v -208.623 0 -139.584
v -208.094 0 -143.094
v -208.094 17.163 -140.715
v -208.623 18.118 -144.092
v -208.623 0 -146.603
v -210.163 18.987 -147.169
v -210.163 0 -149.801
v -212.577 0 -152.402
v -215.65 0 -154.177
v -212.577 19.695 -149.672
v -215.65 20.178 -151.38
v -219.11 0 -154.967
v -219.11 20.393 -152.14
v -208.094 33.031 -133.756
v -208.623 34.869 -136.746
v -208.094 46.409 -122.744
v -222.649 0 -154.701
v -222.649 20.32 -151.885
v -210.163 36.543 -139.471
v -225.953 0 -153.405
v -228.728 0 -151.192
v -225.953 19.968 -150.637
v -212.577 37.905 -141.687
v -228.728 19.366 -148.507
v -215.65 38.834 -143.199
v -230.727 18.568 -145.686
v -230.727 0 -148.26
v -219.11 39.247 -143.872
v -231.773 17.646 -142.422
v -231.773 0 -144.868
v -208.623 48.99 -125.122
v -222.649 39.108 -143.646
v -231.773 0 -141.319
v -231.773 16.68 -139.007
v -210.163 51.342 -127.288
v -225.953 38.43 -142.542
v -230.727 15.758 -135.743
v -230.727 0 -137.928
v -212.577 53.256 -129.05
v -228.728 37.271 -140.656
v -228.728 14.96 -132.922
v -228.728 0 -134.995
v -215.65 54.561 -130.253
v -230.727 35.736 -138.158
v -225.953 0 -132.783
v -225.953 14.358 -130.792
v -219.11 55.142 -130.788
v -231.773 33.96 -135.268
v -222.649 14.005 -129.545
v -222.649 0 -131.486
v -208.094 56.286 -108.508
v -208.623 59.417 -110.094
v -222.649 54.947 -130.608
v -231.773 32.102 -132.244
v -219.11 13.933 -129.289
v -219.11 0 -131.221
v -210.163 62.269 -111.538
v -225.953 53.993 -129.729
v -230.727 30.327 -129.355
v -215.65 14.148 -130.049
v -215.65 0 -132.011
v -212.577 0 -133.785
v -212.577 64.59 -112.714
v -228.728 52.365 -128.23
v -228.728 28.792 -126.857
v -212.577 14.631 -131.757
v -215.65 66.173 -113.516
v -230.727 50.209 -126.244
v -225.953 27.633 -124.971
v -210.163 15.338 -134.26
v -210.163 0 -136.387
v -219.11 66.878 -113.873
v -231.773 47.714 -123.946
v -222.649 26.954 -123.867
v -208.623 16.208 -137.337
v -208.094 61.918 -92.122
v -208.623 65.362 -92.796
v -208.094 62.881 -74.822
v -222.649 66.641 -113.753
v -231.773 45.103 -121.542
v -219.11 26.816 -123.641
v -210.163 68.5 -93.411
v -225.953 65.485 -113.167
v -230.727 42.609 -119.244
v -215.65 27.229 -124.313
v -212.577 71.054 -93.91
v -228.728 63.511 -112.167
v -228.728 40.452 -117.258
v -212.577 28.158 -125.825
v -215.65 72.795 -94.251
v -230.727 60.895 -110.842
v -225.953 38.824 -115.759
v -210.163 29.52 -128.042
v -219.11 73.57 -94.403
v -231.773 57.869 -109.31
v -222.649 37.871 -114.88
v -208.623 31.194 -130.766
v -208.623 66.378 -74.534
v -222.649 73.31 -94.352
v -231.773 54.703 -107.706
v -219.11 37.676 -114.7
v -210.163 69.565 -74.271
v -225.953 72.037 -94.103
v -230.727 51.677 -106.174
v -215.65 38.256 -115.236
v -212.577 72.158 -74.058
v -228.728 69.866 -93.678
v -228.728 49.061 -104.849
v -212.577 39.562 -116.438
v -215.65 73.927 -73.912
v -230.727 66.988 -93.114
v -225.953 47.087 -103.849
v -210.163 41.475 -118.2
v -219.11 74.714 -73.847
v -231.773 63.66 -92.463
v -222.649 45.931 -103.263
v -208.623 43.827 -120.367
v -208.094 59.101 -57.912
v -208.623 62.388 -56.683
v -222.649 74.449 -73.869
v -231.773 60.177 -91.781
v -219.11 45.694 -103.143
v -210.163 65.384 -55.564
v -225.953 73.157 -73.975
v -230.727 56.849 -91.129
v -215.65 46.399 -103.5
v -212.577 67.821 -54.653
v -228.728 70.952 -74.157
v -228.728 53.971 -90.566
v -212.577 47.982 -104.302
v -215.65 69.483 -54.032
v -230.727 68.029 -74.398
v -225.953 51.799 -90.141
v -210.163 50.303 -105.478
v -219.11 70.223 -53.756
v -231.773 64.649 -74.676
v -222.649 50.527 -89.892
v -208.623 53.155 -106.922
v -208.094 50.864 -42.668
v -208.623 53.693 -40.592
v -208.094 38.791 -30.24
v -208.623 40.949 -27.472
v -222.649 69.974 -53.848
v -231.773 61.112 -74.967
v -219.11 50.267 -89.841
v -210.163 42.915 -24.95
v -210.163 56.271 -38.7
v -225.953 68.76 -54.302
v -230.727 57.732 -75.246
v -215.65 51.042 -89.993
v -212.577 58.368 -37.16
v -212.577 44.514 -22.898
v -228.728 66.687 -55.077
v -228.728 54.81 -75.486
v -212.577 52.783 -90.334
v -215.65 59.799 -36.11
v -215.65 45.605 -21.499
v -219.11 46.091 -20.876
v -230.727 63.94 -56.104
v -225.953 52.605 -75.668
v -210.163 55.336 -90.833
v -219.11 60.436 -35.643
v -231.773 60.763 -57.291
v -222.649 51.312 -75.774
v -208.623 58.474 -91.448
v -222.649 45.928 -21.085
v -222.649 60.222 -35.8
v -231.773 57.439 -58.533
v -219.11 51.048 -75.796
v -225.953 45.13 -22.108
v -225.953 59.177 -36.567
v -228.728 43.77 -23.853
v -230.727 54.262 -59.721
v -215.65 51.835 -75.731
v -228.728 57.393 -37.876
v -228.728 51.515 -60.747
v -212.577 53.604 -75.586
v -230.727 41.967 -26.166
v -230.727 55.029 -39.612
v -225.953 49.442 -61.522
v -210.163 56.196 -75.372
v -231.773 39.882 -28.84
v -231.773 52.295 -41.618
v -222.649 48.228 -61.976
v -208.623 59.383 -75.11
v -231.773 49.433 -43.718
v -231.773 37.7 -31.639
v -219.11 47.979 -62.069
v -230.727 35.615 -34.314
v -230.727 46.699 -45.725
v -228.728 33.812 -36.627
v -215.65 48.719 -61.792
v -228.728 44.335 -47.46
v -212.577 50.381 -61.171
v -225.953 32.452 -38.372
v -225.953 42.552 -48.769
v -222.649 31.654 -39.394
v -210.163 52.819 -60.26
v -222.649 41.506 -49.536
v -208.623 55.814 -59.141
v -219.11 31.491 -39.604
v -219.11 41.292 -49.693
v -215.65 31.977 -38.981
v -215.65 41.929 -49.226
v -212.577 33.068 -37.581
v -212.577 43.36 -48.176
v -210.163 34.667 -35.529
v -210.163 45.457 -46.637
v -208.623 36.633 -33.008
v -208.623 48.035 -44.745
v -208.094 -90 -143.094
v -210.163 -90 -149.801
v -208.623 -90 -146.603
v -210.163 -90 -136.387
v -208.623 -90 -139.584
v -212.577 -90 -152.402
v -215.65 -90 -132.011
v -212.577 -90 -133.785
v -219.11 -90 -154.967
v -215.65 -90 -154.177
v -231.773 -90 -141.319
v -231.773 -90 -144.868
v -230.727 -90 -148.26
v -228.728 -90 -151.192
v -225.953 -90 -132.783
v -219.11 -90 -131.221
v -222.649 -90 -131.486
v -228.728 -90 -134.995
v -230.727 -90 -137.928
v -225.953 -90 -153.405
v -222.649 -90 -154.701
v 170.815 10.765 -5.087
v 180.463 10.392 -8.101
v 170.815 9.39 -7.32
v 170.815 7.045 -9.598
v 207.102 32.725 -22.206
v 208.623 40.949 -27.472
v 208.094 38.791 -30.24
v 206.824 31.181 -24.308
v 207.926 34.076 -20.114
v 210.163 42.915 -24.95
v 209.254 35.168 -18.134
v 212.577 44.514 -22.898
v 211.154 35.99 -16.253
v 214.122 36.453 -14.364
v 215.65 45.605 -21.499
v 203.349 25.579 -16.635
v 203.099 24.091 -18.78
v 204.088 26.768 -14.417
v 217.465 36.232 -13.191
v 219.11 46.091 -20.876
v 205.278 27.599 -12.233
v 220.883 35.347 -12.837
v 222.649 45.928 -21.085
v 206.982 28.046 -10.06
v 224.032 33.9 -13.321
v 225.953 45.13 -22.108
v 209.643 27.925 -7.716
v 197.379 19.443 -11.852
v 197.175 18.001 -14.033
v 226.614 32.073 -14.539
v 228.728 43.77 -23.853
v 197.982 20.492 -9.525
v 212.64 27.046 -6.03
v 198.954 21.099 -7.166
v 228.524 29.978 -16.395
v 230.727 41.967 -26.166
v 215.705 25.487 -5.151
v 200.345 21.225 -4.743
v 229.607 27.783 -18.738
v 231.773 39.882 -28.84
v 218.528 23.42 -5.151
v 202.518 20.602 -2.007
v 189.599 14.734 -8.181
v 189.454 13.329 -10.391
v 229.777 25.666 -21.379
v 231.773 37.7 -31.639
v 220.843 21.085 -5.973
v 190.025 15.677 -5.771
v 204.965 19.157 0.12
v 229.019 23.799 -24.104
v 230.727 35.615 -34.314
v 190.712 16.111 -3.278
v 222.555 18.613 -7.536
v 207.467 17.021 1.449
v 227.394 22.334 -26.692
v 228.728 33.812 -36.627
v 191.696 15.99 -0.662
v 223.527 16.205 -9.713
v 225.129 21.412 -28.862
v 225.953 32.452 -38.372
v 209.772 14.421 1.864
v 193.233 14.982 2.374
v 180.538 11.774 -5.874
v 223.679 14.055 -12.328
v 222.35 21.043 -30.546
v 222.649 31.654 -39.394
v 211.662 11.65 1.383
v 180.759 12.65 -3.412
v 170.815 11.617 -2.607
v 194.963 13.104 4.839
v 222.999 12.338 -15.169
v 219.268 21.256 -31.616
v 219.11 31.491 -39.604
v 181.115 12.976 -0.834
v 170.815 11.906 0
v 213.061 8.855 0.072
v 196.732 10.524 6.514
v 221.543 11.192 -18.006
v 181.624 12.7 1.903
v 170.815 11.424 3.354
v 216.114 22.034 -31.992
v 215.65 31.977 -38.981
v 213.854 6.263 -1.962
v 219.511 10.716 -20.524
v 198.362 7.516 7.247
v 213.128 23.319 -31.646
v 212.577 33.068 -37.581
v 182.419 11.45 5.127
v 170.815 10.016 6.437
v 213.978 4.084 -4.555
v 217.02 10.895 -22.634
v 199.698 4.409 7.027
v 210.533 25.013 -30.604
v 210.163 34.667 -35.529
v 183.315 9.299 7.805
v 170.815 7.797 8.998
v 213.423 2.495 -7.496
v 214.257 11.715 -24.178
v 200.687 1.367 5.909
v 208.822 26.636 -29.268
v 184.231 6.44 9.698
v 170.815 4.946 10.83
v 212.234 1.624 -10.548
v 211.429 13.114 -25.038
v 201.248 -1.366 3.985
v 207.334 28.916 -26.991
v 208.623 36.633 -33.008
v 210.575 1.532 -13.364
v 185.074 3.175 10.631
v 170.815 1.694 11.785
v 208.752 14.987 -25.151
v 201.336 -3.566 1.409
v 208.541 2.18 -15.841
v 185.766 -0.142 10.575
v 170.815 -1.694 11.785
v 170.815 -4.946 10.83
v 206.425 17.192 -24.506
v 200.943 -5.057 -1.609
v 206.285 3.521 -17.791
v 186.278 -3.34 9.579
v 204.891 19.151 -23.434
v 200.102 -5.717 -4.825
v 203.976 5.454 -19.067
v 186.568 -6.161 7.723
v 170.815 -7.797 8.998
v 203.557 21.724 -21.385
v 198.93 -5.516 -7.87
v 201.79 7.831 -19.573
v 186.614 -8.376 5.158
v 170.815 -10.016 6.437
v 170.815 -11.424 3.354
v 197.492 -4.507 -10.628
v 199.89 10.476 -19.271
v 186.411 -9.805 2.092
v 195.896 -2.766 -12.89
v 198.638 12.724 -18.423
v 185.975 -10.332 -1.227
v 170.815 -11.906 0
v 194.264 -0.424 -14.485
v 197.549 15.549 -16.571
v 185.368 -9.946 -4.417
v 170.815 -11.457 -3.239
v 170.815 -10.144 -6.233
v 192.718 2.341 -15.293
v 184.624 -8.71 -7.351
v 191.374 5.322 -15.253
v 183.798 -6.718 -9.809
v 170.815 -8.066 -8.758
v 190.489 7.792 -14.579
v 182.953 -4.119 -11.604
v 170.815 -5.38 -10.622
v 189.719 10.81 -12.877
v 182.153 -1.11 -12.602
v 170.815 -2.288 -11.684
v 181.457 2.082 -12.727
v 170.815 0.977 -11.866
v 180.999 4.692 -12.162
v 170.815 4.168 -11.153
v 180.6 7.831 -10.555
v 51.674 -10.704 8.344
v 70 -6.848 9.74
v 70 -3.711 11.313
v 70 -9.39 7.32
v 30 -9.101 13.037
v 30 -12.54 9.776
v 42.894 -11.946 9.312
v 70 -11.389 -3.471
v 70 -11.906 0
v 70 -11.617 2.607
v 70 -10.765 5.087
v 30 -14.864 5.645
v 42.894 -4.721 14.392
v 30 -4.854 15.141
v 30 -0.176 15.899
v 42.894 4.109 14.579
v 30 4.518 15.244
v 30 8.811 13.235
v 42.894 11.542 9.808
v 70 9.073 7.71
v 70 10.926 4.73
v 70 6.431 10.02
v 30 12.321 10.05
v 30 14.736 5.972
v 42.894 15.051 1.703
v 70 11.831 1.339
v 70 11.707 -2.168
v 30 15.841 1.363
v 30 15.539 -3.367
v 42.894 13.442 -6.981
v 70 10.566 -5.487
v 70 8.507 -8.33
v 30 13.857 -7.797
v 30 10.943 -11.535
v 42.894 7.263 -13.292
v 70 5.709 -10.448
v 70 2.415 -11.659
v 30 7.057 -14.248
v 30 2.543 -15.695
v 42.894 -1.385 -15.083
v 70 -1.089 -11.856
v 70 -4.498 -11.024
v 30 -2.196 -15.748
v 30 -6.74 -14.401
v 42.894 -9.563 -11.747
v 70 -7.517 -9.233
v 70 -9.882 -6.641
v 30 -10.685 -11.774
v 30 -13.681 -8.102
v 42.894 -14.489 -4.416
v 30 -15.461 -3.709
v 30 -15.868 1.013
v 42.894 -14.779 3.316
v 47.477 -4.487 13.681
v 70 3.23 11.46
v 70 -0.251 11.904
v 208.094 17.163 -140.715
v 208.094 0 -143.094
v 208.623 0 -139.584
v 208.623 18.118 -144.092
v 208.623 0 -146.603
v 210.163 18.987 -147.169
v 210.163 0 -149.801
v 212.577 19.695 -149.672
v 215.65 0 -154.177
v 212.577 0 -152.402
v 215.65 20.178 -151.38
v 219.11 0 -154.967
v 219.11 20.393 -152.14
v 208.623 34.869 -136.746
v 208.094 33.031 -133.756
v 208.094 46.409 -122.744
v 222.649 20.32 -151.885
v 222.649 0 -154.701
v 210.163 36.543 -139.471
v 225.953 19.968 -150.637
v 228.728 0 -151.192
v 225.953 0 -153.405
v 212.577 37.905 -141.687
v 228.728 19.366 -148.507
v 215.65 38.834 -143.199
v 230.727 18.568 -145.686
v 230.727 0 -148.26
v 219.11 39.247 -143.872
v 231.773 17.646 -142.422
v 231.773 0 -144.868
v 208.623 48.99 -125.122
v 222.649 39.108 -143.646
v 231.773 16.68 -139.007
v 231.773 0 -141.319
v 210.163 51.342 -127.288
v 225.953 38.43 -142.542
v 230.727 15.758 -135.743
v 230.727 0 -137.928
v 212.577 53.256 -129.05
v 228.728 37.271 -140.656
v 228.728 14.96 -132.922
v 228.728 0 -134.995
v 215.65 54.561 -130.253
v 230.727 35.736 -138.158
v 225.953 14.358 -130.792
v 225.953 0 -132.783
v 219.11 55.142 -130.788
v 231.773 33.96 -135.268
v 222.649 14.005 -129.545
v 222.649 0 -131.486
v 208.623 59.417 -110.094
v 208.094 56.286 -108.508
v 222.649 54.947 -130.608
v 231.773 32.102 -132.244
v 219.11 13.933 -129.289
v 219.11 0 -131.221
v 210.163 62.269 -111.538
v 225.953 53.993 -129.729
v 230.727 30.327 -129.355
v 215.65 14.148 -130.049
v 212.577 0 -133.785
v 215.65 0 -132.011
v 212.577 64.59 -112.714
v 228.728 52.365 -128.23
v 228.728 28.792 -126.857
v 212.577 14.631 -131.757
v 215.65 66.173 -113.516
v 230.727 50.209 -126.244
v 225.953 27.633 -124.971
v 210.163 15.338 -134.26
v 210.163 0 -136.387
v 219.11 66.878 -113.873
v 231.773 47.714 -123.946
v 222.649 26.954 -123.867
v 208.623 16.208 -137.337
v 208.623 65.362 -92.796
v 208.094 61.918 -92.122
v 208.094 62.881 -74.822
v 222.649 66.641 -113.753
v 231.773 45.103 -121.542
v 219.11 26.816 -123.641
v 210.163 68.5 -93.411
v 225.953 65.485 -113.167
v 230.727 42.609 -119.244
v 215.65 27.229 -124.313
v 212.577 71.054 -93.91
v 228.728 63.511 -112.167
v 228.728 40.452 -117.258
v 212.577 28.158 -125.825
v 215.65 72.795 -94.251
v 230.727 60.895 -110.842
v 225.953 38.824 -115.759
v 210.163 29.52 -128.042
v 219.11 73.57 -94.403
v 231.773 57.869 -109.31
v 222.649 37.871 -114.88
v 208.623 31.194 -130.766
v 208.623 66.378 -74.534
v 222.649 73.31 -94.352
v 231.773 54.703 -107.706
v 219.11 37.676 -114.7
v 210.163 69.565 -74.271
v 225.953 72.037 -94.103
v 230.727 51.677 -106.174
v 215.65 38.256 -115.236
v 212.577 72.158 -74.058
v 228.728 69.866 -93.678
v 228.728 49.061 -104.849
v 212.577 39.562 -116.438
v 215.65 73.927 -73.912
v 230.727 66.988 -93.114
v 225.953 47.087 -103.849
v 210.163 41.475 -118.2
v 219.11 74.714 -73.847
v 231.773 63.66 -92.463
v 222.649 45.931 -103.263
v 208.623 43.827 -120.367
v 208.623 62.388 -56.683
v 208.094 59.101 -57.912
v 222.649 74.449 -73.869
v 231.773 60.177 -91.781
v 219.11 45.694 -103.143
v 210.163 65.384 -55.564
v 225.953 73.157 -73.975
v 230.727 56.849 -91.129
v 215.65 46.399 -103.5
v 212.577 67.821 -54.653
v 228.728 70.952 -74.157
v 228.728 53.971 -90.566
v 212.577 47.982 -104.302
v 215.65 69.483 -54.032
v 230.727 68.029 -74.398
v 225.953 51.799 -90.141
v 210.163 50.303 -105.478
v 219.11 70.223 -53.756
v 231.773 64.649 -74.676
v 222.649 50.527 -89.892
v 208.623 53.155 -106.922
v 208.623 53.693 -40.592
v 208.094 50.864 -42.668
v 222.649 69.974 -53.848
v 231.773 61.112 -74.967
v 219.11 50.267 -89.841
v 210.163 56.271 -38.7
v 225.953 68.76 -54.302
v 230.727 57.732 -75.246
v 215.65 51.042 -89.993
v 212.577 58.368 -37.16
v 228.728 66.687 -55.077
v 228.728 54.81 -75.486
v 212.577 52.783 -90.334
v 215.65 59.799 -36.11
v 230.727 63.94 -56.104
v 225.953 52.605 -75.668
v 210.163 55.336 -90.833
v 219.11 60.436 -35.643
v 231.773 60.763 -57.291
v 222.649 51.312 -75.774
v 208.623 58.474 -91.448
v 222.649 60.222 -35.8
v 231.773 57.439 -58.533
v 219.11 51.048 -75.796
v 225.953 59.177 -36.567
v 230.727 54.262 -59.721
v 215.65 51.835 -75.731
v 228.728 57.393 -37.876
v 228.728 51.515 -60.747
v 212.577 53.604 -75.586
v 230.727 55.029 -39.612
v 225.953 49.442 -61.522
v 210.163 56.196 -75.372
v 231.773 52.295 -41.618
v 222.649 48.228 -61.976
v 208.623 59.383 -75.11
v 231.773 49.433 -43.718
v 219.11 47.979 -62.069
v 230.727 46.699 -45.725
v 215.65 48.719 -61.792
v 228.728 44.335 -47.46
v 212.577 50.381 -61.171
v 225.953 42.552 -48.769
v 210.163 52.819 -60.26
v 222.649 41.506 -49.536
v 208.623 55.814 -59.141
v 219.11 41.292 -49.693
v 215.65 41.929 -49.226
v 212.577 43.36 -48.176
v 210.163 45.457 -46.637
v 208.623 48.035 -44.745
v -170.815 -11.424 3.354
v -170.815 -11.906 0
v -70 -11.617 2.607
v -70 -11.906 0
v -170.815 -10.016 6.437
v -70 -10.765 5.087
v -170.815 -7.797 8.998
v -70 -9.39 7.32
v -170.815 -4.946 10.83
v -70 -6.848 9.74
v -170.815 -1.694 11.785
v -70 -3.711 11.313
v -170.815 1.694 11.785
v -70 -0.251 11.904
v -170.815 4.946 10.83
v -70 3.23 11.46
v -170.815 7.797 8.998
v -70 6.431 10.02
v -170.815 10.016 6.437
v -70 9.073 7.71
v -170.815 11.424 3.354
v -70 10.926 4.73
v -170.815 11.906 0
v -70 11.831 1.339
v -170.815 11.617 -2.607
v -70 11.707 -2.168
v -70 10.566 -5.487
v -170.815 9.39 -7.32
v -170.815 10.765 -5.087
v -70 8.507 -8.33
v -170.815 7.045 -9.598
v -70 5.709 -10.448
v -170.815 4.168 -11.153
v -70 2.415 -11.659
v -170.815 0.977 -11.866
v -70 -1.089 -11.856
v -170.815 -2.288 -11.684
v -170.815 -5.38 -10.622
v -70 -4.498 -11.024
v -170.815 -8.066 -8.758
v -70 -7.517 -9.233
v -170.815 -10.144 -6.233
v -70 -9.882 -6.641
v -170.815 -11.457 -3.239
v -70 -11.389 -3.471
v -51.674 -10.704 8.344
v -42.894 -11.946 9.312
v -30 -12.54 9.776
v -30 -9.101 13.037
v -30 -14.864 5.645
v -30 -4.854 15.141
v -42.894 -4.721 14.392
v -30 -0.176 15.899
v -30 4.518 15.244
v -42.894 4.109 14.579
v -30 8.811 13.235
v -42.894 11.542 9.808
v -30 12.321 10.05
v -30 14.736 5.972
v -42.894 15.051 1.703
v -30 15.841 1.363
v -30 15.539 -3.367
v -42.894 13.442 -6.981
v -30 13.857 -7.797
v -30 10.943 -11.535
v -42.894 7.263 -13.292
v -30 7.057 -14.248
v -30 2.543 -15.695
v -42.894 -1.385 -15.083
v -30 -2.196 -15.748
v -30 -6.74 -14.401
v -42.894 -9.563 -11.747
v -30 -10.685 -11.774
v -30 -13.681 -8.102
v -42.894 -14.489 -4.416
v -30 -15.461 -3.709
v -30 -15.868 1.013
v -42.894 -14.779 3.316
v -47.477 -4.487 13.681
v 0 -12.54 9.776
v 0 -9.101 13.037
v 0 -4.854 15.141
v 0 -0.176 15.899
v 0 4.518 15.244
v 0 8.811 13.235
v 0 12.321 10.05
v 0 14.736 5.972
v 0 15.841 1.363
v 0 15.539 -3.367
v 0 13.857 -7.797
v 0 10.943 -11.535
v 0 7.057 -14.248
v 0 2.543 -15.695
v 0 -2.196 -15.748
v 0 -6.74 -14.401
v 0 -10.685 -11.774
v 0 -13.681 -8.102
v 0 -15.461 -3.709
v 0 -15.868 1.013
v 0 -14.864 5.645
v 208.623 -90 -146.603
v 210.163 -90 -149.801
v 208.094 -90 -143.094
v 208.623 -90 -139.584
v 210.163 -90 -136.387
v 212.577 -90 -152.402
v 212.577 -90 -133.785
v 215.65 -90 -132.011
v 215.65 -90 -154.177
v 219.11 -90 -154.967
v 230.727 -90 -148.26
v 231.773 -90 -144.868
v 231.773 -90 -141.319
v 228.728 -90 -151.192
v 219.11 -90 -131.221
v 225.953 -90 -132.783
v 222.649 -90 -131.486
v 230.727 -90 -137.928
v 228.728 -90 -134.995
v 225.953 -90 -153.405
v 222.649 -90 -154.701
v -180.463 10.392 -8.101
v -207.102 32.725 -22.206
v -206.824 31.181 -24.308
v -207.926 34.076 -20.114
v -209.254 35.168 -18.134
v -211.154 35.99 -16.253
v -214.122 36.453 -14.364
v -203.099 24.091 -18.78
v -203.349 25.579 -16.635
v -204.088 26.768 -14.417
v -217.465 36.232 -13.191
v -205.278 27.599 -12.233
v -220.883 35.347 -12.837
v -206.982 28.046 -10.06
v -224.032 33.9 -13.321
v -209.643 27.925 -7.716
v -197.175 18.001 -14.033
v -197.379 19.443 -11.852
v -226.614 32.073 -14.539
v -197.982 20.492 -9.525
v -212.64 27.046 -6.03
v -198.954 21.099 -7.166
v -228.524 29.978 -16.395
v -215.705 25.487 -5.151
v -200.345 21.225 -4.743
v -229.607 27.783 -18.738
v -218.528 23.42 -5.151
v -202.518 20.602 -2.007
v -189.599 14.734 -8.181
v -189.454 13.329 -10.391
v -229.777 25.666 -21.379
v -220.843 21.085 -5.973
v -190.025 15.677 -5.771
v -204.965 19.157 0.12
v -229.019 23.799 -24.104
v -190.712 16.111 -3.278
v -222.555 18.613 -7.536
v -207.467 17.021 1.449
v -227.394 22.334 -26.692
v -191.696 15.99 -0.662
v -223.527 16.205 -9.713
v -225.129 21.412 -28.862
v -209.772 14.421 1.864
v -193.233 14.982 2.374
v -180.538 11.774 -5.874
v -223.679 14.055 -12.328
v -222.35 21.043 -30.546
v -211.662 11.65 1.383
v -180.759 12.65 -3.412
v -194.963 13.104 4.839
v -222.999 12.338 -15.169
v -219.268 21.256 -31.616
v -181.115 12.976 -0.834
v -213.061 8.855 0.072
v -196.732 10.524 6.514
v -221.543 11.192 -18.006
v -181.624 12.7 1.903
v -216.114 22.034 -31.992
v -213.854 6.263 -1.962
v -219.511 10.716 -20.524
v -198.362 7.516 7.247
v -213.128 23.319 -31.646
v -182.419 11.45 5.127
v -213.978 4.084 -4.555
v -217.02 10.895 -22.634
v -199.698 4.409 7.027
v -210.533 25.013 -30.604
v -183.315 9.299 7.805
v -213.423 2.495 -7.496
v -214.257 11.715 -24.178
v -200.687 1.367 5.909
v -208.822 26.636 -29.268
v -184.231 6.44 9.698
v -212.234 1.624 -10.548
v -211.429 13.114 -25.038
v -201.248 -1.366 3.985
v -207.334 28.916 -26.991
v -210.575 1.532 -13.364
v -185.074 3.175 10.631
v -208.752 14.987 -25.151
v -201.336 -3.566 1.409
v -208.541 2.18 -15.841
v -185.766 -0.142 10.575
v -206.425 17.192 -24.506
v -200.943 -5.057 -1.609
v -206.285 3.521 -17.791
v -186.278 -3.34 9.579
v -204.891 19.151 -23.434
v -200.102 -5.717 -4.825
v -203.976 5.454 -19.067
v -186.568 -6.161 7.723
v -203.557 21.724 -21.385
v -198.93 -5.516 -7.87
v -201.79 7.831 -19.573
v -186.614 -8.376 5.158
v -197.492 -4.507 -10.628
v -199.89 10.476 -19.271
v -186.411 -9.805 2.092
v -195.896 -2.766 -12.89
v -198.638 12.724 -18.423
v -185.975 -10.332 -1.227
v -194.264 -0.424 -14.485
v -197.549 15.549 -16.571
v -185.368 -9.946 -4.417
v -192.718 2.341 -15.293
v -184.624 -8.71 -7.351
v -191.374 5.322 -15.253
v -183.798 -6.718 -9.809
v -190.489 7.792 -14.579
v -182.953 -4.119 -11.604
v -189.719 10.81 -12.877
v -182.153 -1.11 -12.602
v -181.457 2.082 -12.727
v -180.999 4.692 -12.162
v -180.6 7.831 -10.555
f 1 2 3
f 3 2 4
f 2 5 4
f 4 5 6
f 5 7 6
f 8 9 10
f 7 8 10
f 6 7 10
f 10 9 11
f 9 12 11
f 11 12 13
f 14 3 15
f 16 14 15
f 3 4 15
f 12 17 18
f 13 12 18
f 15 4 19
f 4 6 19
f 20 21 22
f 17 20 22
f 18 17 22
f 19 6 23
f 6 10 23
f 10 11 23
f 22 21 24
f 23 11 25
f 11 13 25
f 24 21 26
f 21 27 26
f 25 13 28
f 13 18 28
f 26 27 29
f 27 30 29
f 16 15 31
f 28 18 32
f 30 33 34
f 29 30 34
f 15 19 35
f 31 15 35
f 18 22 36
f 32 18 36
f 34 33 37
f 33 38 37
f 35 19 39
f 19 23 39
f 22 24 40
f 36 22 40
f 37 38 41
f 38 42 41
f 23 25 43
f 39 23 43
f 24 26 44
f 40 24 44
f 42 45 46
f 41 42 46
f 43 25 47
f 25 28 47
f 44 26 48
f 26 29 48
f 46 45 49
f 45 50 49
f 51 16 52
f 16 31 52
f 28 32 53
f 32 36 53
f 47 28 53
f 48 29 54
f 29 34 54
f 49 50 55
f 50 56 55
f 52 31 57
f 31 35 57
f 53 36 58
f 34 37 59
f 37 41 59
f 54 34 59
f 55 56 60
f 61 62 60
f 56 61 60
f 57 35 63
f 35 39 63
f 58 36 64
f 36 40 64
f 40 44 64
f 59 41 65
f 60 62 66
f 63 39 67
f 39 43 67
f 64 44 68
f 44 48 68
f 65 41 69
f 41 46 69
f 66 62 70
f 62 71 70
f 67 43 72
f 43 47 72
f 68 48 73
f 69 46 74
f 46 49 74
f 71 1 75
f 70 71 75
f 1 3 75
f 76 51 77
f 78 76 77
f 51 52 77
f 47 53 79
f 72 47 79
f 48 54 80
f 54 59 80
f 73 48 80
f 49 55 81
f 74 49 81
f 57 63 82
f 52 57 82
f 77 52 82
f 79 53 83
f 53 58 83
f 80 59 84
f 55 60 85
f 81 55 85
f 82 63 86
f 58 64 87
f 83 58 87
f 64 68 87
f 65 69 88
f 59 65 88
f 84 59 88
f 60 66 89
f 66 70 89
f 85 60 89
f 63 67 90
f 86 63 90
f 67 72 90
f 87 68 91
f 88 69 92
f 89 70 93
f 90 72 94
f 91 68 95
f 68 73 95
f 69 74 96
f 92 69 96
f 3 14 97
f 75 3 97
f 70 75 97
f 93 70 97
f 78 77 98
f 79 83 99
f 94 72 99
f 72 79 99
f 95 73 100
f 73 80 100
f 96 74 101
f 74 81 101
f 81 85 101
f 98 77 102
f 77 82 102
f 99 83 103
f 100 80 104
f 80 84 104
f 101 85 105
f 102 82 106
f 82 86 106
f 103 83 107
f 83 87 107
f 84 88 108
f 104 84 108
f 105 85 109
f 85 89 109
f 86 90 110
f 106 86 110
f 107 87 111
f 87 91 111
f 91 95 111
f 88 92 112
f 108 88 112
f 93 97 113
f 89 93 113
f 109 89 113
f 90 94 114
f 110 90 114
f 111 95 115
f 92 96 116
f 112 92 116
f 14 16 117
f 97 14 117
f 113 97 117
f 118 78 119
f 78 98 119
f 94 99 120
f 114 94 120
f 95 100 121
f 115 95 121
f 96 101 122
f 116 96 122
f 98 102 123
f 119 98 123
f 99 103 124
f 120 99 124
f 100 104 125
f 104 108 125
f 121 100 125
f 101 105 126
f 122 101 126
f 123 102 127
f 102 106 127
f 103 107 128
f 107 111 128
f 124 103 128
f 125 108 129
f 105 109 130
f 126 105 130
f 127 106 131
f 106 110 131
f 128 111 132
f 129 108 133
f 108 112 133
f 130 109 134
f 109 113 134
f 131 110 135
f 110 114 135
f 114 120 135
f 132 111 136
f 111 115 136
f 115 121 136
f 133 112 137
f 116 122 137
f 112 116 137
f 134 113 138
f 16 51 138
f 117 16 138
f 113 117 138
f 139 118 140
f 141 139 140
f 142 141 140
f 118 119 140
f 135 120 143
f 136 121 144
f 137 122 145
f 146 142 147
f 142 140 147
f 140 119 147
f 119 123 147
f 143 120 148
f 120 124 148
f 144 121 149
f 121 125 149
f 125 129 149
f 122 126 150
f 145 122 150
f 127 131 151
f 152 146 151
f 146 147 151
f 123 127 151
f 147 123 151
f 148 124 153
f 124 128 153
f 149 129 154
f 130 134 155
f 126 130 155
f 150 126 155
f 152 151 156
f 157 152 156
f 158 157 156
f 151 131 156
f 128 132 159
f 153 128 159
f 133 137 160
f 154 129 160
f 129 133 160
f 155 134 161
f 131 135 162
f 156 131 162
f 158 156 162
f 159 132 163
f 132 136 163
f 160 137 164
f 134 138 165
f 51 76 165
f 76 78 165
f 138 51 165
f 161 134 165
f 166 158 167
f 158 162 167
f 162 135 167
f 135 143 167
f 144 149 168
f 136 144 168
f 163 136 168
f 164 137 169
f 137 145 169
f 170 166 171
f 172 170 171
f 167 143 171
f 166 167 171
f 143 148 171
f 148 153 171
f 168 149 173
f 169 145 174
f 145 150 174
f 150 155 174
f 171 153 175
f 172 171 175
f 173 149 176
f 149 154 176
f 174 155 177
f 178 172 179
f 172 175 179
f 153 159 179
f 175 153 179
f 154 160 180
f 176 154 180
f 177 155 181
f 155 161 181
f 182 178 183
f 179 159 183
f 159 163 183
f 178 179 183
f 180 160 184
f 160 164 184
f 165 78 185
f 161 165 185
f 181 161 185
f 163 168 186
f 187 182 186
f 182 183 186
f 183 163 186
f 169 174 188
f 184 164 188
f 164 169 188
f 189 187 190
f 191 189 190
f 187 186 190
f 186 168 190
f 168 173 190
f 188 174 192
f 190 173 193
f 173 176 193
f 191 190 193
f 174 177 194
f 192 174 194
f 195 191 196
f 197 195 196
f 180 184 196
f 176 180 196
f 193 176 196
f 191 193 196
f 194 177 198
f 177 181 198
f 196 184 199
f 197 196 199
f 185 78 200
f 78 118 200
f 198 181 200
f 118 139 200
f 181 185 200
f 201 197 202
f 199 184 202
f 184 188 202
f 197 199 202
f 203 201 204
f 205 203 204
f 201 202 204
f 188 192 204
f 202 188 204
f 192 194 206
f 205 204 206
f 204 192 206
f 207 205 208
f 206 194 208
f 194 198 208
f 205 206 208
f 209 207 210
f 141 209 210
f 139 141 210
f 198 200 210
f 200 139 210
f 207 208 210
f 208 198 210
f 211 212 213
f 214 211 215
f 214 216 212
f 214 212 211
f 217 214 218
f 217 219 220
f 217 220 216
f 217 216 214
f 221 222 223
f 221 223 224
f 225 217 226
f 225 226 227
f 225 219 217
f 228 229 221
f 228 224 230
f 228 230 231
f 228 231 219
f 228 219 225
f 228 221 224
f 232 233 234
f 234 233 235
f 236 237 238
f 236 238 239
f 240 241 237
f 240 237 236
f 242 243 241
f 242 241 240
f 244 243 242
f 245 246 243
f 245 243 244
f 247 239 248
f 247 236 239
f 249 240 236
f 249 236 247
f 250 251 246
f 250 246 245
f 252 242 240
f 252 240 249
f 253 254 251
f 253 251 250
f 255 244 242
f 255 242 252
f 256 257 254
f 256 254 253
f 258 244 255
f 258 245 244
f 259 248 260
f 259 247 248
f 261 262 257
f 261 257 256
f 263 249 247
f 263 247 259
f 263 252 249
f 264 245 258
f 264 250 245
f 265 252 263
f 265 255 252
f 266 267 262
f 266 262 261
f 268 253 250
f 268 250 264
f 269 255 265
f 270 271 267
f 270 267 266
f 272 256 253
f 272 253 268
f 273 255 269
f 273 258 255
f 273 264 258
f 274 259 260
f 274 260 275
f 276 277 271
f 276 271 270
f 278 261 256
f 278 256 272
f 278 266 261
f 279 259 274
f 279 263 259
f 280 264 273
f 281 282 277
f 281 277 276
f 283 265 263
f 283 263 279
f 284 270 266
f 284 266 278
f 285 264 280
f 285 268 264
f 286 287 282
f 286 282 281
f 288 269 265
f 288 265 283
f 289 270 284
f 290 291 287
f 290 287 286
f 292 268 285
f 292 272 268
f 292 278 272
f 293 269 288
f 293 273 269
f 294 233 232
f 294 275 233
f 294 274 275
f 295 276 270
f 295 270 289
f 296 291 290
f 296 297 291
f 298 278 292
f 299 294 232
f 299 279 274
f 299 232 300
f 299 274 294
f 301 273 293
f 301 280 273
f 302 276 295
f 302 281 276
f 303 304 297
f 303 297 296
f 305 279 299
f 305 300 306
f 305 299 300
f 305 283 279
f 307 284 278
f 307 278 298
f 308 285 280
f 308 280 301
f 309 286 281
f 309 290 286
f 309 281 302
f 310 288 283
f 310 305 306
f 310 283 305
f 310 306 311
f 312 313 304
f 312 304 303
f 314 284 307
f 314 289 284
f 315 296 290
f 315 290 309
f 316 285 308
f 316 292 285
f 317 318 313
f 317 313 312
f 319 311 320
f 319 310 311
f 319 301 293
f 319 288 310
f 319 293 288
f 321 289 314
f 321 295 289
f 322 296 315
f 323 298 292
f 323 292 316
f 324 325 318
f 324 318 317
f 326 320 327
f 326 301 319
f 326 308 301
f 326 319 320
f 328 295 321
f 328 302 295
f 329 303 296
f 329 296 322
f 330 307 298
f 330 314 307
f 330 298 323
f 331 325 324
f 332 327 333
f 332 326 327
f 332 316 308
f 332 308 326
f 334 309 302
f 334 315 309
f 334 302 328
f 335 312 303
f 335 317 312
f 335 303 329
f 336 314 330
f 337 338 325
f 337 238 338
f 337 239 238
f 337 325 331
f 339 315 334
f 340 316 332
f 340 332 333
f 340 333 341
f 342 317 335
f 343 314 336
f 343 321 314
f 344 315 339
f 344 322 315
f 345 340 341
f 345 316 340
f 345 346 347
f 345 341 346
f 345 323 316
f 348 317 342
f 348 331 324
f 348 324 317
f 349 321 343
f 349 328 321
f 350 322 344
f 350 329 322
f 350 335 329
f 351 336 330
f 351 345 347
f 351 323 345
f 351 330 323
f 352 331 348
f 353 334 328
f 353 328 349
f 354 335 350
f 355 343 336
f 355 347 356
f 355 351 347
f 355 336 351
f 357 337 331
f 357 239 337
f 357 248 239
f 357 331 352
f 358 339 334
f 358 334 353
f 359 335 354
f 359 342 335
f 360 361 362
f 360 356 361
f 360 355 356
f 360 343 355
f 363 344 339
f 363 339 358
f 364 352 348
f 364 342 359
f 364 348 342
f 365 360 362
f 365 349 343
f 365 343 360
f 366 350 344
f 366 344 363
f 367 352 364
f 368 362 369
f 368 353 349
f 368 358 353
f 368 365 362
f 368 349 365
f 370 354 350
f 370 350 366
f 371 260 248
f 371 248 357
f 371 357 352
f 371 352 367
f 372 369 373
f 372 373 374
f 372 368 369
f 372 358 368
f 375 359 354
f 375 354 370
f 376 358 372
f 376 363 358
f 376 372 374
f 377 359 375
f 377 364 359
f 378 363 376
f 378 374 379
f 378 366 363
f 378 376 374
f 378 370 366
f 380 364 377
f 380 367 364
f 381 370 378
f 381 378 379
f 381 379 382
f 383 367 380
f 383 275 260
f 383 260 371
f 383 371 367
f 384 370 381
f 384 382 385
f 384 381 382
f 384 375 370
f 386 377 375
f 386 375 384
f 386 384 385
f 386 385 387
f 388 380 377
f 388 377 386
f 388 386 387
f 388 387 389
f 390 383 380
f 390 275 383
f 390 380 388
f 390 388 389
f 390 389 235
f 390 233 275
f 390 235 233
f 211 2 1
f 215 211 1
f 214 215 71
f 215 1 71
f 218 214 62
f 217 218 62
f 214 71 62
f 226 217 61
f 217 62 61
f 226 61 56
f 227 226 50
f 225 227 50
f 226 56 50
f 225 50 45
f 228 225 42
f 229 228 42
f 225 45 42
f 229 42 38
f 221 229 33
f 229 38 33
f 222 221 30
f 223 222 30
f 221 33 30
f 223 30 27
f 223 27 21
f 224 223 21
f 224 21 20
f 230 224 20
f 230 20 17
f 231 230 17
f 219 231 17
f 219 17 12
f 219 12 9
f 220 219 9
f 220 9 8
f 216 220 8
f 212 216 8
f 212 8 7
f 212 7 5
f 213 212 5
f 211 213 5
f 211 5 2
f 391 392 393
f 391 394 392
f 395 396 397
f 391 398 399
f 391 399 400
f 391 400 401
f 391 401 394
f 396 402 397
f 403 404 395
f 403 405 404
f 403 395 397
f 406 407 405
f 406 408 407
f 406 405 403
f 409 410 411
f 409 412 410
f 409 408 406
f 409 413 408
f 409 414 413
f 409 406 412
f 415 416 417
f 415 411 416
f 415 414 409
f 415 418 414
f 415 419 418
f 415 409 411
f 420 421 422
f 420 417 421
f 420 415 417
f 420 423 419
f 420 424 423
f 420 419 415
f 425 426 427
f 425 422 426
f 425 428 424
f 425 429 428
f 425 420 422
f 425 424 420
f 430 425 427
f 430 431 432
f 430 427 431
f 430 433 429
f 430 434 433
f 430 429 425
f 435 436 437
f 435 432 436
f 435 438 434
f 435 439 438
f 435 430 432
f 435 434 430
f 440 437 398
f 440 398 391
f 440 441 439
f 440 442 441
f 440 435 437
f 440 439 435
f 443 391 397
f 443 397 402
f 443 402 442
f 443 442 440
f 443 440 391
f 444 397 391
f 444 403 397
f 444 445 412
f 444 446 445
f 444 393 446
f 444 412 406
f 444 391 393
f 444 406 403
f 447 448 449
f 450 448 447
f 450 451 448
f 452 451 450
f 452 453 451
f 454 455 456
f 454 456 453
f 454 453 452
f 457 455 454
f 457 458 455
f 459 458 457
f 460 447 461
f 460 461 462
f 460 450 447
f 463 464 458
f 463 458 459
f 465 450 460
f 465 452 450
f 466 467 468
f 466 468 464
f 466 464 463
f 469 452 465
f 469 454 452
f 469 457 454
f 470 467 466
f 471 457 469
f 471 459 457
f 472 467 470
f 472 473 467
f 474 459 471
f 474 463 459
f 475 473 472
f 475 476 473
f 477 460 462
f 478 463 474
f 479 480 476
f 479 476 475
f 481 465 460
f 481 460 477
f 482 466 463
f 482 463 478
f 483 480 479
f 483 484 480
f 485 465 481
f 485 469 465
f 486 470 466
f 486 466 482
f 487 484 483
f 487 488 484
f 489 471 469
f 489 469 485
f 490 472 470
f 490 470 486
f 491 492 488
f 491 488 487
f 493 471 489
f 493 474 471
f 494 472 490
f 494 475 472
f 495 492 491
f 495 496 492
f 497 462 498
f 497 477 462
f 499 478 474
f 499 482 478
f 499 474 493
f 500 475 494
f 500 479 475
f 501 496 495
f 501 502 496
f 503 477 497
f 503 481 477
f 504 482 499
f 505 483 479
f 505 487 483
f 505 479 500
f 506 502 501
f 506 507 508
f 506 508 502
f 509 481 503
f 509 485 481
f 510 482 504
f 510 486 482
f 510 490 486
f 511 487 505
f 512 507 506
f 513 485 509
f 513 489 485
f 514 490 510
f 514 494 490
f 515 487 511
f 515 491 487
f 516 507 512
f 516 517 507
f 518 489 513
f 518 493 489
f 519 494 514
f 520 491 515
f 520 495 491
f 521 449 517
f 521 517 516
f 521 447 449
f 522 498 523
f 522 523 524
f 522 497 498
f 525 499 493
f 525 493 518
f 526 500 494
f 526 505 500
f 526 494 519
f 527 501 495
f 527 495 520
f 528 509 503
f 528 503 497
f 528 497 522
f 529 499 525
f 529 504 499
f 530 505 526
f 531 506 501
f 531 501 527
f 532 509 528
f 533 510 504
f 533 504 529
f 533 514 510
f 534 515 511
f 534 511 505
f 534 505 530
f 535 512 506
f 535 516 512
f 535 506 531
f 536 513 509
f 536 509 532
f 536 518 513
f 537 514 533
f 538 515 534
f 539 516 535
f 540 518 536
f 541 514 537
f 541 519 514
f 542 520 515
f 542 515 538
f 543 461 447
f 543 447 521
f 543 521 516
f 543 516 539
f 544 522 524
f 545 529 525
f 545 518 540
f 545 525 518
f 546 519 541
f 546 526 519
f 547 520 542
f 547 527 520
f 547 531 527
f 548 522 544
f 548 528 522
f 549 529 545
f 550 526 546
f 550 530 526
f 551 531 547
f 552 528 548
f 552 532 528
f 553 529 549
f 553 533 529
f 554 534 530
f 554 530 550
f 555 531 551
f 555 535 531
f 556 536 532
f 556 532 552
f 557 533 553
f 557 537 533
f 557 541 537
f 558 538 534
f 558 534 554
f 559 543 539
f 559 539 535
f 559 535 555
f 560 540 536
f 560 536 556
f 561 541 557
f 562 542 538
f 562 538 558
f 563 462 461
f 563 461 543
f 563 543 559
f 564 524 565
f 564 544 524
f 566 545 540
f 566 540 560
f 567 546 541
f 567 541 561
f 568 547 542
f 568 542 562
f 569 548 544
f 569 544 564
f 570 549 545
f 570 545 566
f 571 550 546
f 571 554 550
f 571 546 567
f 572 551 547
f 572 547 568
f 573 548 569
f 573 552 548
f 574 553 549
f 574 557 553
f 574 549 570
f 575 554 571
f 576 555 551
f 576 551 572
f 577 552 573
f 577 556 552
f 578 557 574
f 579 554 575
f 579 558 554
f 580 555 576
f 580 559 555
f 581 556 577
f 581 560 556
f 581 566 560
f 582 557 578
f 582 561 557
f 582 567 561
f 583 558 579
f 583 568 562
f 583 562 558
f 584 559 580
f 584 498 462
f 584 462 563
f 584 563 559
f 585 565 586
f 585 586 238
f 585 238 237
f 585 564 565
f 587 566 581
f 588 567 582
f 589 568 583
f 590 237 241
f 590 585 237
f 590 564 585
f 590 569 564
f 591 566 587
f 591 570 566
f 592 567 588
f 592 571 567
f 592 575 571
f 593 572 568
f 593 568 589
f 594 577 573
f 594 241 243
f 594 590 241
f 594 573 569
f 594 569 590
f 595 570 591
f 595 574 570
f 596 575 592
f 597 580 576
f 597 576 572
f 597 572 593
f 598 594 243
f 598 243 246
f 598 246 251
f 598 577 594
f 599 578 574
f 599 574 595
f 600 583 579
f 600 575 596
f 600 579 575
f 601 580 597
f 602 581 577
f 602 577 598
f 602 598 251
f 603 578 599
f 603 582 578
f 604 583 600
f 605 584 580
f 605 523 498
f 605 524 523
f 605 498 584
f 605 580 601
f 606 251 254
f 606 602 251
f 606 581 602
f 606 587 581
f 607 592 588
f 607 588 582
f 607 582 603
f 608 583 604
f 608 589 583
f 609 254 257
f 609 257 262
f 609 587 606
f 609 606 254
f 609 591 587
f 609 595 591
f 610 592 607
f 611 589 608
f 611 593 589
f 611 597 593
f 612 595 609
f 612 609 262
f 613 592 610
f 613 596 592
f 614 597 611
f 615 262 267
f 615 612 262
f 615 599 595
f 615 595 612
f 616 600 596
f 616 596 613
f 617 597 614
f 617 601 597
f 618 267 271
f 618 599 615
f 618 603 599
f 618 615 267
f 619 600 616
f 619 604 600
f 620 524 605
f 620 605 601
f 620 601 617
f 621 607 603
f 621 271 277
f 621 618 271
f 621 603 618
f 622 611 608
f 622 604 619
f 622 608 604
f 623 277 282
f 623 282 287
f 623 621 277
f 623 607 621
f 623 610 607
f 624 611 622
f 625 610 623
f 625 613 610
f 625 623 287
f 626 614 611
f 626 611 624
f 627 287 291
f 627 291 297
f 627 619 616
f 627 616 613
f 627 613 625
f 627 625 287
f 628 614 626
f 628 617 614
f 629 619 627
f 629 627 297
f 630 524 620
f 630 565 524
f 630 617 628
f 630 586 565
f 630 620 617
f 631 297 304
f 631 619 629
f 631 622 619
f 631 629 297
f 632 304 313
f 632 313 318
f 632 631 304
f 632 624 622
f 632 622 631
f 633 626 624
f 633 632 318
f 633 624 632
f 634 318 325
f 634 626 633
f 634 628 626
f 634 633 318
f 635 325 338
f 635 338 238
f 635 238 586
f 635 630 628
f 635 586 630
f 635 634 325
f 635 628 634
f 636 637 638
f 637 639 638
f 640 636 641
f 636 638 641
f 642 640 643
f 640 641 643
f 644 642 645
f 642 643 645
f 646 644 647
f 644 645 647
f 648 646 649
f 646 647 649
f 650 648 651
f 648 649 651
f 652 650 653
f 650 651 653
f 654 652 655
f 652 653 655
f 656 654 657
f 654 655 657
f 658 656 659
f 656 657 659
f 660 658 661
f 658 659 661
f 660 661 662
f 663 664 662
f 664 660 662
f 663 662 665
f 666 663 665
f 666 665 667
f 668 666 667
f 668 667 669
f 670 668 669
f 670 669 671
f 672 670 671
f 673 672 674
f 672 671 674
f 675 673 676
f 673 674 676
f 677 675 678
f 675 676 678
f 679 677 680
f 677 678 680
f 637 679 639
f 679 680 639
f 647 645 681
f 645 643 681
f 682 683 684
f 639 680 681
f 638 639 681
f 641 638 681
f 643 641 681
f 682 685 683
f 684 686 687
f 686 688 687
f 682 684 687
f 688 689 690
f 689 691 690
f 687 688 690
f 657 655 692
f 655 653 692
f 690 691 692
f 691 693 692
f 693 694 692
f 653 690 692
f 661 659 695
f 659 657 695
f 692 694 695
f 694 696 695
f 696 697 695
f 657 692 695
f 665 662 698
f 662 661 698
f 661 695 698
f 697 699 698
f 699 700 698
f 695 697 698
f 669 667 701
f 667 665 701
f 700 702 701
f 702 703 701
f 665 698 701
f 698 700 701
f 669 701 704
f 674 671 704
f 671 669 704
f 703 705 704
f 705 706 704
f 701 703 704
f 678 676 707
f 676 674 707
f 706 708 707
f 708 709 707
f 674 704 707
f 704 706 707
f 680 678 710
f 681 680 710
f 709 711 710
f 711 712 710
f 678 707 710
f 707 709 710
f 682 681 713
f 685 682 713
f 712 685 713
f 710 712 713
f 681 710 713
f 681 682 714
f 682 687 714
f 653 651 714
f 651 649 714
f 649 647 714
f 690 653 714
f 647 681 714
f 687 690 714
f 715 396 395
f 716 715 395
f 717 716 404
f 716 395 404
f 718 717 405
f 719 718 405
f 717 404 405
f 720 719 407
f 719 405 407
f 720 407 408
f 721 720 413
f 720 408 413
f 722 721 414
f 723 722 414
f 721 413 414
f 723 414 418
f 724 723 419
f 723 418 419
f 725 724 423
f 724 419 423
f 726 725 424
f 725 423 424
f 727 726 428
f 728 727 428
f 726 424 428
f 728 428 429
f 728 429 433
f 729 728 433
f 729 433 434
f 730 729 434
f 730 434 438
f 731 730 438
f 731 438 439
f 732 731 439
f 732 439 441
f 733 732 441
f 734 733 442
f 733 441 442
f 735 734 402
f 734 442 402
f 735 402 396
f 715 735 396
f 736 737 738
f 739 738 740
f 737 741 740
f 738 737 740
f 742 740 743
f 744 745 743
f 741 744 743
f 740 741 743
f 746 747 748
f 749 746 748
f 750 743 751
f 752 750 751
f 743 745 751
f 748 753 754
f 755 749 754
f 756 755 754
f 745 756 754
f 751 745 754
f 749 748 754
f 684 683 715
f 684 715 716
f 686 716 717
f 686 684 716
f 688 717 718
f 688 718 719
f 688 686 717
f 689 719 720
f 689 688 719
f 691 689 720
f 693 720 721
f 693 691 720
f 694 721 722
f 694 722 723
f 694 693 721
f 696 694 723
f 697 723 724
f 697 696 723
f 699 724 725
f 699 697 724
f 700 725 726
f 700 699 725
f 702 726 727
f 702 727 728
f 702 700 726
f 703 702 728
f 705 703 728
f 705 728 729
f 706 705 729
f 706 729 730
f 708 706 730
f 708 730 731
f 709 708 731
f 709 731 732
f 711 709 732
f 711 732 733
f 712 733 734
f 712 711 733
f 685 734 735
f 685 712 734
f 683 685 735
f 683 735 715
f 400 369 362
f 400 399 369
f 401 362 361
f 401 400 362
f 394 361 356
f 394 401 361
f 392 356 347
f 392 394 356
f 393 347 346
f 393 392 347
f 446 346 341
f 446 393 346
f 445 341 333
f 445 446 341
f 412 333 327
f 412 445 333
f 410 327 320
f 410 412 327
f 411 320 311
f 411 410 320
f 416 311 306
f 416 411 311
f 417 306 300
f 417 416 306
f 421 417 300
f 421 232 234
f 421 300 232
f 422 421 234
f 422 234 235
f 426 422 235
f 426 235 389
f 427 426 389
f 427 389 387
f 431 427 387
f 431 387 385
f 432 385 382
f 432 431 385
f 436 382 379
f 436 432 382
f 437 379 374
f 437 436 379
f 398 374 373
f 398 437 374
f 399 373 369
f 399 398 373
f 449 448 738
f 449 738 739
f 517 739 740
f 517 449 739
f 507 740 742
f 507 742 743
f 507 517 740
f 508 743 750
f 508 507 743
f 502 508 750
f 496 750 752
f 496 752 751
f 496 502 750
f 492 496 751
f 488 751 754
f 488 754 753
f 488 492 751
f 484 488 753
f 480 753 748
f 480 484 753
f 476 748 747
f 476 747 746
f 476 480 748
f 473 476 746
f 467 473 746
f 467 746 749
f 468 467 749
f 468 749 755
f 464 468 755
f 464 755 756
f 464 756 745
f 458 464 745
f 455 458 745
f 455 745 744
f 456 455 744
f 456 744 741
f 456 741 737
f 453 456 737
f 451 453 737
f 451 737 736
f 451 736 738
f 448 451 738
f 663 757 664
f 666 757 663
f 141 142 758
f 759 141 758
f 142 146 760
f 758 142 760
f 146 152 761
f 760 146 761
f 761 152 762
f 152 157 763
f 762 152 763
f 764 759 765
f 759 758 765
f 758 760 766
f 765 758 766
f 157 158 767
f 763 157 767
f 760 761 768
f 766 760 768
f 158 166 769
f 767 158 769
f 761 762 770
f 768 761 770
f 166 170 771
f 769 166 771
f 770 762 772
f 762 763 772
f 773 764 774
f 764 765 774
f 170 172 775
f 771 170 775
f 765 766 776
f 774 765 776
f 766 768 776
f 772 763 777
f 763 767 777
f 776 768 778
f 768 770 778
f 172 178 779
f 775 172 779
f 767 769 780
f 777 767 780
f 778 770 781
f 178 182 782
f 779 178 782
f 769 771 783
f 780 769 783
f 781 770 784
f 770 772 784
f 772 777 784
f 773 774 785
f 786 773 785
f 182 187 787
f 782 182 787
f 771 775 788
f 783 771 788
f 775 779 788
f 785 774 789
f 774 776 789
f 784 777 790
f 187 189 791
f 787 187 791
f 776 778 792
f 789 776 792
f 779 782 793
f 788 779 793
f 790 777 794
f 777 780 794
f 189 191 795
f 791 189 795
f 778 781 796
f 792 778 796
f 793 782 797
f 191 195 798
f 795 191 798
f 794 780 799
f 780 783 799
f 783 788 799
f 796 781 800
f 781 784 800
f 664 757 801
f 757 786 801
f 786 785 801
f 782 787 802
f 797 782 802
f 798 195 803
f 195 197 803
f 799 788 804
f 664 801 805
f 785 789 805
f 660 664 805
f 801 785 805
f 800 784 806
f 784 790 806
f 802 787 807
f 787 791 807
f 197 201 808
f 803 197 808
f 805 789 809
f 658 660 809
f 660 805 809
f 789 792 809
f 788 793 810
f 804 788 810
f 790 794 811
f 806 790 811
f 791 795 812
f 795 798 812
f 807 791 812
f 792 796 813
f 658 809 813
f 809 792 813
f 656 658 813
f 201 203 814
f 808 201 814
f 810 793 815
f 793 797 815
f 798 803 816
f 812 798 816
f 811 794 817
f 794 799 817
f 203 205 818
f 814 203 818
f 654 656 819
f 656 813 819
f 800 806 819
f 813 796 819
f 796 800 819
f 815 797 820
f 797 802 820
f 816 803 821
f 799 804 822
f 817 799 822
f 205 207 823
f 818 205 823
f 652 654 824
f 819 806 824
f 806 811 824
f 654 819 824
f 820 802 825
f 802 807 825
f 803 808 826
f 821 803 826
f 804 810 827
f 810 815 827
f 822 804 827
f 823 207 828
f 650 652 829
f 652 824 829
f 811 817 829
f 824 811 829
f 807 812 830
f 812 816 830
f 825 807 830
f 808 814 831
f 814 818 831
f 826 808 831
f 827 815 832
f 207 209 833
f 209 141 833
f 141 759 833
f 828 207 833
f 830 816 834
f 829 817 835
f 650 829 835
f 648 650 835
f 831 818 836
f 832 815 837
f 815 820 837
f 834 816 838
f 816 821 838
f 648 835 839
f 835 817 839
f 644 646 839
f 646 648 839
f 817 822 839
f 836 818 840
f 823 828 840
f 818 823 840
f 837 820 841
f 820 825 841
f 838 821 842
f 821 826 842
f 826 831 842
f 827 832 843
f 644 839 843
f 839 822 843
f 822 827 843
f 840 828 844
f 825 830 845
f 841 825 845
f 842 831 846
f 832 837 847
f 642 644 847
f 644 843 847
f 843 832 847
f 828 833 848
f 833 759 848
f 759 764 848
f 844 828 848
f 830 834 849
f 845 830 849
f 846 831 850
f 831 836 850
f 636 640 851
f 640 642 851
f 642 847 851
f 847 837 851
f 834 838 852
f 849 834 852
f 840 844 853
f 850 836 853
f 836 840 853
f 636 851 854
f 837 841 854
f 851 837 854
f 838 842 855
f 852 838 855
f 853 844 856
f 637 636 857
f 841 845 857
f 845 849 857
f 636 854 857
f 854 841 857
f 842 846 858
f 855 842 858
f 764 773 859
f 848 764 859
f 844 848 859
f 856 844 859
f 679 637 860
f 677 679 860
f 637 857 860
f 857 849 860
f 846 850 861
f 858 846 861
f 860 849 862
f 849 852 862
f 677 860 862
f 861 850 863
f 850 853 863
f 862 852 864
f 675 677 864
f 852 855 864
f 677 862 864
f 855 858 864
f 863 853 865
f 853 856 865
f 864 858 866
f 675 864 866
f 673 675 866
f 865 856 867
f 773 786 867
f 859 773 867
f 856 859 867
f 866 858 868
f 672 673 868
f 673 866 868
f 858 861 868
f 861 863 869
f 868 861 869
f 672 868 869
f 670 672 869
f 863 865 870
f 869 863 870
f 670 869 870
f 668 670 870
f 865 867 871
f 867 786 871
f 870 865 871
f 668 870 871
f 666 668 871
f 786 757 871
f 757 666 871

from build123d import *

# Parameters (mm, degrees)
F4_R       = 11.90625
F11_FACE_R = 11.90625
F13_FACE_R = 11.90625


with BuildPart() as f11:
    # F11: sweep along a path in F8, F10
    with BuildLine(Plane(origin=(220, 0, 0), x_dir=(0, -1, 0), z_dir=(-1, 0, 0))) as f11_path:
        Line((90, -143.09375), (0, -143.09375))
        ThreePointArc((0, -143.09375), (-59.6673406444, -100.5092600912), (-38.7909423113, -30.2397338867))
    with BuildLine(Plane(origin=(0, 0, 0), x_dir=(1, 0, 0), z_dir=(0, 0.6148143407, 0.788671875))) as f11_path_2:
        ThreePointArc((170.8148527405, 0), (205.5940039014, 14.4059960986), (220, 49.1851472595))
    # F4 (on line) → F11 (sweep)
    with BuildSketch(Plane(origin=(0, -90, 0), x_dir=(-1, 0, 0), z_dir=(0, 1, 0))):
        with Locations((-220, -143.09375)):
            Circle(F4_R)
    sweep(path=f11_path.line + f11_path_2.line)



with BuildPart() as f13:
    # F12 (on 3pt) → F13 (revolve)
    with BuildSketch(Plane(origin=(0, 0, 0), x_dir=(1, 0, 0), z_dir=(0, 0.6148143407, 0.788671875))):
        with BuildLine():
            Line((0, 0), (0, -15.9))
            Line((0, -15.9), (30, -15.9))
            add(Edge.make_bspline(
                [(70, -11.90625), (50, -11.90625), (50, -15.9), (30, -15.9)],
                knots=[0, 0, 0, 0, 40.1988810673, 40.1988810673, 40.1988810673, 40.1988810673], degree=3))
            Line((70, -11.90625), (70, 0))
            Line((70, 0), (0, 0))
        make_face()
    revolve(axis=Axis((85.4074263703, 0, 0), (-1, 0, 0)))


with BuildPart() as f11_1:
    add(f11.part)

    add(f13.part)  # F14 merges F13
    # F11_face (on face) → F14 section 0
    with BuildSketch(Plane(origin=(170.8148527405, 0, 0), x_dir=(0, -1, 0), z_dir=(-1, 0, 0))):
        Circle(F11_FACE_R)
    # F13_face (on face) → F14 section 1
    with BuildSketch(Plane.YZ.offset(70)):
        Circle(F13_FACE_R)
    loft()

    # F15: F11 across plane


with BuildPart() as f11_2:
    add(f11_1.part)
    add(f11_1.part.mirror(Plane.YZ))


solid = f11_2.part
